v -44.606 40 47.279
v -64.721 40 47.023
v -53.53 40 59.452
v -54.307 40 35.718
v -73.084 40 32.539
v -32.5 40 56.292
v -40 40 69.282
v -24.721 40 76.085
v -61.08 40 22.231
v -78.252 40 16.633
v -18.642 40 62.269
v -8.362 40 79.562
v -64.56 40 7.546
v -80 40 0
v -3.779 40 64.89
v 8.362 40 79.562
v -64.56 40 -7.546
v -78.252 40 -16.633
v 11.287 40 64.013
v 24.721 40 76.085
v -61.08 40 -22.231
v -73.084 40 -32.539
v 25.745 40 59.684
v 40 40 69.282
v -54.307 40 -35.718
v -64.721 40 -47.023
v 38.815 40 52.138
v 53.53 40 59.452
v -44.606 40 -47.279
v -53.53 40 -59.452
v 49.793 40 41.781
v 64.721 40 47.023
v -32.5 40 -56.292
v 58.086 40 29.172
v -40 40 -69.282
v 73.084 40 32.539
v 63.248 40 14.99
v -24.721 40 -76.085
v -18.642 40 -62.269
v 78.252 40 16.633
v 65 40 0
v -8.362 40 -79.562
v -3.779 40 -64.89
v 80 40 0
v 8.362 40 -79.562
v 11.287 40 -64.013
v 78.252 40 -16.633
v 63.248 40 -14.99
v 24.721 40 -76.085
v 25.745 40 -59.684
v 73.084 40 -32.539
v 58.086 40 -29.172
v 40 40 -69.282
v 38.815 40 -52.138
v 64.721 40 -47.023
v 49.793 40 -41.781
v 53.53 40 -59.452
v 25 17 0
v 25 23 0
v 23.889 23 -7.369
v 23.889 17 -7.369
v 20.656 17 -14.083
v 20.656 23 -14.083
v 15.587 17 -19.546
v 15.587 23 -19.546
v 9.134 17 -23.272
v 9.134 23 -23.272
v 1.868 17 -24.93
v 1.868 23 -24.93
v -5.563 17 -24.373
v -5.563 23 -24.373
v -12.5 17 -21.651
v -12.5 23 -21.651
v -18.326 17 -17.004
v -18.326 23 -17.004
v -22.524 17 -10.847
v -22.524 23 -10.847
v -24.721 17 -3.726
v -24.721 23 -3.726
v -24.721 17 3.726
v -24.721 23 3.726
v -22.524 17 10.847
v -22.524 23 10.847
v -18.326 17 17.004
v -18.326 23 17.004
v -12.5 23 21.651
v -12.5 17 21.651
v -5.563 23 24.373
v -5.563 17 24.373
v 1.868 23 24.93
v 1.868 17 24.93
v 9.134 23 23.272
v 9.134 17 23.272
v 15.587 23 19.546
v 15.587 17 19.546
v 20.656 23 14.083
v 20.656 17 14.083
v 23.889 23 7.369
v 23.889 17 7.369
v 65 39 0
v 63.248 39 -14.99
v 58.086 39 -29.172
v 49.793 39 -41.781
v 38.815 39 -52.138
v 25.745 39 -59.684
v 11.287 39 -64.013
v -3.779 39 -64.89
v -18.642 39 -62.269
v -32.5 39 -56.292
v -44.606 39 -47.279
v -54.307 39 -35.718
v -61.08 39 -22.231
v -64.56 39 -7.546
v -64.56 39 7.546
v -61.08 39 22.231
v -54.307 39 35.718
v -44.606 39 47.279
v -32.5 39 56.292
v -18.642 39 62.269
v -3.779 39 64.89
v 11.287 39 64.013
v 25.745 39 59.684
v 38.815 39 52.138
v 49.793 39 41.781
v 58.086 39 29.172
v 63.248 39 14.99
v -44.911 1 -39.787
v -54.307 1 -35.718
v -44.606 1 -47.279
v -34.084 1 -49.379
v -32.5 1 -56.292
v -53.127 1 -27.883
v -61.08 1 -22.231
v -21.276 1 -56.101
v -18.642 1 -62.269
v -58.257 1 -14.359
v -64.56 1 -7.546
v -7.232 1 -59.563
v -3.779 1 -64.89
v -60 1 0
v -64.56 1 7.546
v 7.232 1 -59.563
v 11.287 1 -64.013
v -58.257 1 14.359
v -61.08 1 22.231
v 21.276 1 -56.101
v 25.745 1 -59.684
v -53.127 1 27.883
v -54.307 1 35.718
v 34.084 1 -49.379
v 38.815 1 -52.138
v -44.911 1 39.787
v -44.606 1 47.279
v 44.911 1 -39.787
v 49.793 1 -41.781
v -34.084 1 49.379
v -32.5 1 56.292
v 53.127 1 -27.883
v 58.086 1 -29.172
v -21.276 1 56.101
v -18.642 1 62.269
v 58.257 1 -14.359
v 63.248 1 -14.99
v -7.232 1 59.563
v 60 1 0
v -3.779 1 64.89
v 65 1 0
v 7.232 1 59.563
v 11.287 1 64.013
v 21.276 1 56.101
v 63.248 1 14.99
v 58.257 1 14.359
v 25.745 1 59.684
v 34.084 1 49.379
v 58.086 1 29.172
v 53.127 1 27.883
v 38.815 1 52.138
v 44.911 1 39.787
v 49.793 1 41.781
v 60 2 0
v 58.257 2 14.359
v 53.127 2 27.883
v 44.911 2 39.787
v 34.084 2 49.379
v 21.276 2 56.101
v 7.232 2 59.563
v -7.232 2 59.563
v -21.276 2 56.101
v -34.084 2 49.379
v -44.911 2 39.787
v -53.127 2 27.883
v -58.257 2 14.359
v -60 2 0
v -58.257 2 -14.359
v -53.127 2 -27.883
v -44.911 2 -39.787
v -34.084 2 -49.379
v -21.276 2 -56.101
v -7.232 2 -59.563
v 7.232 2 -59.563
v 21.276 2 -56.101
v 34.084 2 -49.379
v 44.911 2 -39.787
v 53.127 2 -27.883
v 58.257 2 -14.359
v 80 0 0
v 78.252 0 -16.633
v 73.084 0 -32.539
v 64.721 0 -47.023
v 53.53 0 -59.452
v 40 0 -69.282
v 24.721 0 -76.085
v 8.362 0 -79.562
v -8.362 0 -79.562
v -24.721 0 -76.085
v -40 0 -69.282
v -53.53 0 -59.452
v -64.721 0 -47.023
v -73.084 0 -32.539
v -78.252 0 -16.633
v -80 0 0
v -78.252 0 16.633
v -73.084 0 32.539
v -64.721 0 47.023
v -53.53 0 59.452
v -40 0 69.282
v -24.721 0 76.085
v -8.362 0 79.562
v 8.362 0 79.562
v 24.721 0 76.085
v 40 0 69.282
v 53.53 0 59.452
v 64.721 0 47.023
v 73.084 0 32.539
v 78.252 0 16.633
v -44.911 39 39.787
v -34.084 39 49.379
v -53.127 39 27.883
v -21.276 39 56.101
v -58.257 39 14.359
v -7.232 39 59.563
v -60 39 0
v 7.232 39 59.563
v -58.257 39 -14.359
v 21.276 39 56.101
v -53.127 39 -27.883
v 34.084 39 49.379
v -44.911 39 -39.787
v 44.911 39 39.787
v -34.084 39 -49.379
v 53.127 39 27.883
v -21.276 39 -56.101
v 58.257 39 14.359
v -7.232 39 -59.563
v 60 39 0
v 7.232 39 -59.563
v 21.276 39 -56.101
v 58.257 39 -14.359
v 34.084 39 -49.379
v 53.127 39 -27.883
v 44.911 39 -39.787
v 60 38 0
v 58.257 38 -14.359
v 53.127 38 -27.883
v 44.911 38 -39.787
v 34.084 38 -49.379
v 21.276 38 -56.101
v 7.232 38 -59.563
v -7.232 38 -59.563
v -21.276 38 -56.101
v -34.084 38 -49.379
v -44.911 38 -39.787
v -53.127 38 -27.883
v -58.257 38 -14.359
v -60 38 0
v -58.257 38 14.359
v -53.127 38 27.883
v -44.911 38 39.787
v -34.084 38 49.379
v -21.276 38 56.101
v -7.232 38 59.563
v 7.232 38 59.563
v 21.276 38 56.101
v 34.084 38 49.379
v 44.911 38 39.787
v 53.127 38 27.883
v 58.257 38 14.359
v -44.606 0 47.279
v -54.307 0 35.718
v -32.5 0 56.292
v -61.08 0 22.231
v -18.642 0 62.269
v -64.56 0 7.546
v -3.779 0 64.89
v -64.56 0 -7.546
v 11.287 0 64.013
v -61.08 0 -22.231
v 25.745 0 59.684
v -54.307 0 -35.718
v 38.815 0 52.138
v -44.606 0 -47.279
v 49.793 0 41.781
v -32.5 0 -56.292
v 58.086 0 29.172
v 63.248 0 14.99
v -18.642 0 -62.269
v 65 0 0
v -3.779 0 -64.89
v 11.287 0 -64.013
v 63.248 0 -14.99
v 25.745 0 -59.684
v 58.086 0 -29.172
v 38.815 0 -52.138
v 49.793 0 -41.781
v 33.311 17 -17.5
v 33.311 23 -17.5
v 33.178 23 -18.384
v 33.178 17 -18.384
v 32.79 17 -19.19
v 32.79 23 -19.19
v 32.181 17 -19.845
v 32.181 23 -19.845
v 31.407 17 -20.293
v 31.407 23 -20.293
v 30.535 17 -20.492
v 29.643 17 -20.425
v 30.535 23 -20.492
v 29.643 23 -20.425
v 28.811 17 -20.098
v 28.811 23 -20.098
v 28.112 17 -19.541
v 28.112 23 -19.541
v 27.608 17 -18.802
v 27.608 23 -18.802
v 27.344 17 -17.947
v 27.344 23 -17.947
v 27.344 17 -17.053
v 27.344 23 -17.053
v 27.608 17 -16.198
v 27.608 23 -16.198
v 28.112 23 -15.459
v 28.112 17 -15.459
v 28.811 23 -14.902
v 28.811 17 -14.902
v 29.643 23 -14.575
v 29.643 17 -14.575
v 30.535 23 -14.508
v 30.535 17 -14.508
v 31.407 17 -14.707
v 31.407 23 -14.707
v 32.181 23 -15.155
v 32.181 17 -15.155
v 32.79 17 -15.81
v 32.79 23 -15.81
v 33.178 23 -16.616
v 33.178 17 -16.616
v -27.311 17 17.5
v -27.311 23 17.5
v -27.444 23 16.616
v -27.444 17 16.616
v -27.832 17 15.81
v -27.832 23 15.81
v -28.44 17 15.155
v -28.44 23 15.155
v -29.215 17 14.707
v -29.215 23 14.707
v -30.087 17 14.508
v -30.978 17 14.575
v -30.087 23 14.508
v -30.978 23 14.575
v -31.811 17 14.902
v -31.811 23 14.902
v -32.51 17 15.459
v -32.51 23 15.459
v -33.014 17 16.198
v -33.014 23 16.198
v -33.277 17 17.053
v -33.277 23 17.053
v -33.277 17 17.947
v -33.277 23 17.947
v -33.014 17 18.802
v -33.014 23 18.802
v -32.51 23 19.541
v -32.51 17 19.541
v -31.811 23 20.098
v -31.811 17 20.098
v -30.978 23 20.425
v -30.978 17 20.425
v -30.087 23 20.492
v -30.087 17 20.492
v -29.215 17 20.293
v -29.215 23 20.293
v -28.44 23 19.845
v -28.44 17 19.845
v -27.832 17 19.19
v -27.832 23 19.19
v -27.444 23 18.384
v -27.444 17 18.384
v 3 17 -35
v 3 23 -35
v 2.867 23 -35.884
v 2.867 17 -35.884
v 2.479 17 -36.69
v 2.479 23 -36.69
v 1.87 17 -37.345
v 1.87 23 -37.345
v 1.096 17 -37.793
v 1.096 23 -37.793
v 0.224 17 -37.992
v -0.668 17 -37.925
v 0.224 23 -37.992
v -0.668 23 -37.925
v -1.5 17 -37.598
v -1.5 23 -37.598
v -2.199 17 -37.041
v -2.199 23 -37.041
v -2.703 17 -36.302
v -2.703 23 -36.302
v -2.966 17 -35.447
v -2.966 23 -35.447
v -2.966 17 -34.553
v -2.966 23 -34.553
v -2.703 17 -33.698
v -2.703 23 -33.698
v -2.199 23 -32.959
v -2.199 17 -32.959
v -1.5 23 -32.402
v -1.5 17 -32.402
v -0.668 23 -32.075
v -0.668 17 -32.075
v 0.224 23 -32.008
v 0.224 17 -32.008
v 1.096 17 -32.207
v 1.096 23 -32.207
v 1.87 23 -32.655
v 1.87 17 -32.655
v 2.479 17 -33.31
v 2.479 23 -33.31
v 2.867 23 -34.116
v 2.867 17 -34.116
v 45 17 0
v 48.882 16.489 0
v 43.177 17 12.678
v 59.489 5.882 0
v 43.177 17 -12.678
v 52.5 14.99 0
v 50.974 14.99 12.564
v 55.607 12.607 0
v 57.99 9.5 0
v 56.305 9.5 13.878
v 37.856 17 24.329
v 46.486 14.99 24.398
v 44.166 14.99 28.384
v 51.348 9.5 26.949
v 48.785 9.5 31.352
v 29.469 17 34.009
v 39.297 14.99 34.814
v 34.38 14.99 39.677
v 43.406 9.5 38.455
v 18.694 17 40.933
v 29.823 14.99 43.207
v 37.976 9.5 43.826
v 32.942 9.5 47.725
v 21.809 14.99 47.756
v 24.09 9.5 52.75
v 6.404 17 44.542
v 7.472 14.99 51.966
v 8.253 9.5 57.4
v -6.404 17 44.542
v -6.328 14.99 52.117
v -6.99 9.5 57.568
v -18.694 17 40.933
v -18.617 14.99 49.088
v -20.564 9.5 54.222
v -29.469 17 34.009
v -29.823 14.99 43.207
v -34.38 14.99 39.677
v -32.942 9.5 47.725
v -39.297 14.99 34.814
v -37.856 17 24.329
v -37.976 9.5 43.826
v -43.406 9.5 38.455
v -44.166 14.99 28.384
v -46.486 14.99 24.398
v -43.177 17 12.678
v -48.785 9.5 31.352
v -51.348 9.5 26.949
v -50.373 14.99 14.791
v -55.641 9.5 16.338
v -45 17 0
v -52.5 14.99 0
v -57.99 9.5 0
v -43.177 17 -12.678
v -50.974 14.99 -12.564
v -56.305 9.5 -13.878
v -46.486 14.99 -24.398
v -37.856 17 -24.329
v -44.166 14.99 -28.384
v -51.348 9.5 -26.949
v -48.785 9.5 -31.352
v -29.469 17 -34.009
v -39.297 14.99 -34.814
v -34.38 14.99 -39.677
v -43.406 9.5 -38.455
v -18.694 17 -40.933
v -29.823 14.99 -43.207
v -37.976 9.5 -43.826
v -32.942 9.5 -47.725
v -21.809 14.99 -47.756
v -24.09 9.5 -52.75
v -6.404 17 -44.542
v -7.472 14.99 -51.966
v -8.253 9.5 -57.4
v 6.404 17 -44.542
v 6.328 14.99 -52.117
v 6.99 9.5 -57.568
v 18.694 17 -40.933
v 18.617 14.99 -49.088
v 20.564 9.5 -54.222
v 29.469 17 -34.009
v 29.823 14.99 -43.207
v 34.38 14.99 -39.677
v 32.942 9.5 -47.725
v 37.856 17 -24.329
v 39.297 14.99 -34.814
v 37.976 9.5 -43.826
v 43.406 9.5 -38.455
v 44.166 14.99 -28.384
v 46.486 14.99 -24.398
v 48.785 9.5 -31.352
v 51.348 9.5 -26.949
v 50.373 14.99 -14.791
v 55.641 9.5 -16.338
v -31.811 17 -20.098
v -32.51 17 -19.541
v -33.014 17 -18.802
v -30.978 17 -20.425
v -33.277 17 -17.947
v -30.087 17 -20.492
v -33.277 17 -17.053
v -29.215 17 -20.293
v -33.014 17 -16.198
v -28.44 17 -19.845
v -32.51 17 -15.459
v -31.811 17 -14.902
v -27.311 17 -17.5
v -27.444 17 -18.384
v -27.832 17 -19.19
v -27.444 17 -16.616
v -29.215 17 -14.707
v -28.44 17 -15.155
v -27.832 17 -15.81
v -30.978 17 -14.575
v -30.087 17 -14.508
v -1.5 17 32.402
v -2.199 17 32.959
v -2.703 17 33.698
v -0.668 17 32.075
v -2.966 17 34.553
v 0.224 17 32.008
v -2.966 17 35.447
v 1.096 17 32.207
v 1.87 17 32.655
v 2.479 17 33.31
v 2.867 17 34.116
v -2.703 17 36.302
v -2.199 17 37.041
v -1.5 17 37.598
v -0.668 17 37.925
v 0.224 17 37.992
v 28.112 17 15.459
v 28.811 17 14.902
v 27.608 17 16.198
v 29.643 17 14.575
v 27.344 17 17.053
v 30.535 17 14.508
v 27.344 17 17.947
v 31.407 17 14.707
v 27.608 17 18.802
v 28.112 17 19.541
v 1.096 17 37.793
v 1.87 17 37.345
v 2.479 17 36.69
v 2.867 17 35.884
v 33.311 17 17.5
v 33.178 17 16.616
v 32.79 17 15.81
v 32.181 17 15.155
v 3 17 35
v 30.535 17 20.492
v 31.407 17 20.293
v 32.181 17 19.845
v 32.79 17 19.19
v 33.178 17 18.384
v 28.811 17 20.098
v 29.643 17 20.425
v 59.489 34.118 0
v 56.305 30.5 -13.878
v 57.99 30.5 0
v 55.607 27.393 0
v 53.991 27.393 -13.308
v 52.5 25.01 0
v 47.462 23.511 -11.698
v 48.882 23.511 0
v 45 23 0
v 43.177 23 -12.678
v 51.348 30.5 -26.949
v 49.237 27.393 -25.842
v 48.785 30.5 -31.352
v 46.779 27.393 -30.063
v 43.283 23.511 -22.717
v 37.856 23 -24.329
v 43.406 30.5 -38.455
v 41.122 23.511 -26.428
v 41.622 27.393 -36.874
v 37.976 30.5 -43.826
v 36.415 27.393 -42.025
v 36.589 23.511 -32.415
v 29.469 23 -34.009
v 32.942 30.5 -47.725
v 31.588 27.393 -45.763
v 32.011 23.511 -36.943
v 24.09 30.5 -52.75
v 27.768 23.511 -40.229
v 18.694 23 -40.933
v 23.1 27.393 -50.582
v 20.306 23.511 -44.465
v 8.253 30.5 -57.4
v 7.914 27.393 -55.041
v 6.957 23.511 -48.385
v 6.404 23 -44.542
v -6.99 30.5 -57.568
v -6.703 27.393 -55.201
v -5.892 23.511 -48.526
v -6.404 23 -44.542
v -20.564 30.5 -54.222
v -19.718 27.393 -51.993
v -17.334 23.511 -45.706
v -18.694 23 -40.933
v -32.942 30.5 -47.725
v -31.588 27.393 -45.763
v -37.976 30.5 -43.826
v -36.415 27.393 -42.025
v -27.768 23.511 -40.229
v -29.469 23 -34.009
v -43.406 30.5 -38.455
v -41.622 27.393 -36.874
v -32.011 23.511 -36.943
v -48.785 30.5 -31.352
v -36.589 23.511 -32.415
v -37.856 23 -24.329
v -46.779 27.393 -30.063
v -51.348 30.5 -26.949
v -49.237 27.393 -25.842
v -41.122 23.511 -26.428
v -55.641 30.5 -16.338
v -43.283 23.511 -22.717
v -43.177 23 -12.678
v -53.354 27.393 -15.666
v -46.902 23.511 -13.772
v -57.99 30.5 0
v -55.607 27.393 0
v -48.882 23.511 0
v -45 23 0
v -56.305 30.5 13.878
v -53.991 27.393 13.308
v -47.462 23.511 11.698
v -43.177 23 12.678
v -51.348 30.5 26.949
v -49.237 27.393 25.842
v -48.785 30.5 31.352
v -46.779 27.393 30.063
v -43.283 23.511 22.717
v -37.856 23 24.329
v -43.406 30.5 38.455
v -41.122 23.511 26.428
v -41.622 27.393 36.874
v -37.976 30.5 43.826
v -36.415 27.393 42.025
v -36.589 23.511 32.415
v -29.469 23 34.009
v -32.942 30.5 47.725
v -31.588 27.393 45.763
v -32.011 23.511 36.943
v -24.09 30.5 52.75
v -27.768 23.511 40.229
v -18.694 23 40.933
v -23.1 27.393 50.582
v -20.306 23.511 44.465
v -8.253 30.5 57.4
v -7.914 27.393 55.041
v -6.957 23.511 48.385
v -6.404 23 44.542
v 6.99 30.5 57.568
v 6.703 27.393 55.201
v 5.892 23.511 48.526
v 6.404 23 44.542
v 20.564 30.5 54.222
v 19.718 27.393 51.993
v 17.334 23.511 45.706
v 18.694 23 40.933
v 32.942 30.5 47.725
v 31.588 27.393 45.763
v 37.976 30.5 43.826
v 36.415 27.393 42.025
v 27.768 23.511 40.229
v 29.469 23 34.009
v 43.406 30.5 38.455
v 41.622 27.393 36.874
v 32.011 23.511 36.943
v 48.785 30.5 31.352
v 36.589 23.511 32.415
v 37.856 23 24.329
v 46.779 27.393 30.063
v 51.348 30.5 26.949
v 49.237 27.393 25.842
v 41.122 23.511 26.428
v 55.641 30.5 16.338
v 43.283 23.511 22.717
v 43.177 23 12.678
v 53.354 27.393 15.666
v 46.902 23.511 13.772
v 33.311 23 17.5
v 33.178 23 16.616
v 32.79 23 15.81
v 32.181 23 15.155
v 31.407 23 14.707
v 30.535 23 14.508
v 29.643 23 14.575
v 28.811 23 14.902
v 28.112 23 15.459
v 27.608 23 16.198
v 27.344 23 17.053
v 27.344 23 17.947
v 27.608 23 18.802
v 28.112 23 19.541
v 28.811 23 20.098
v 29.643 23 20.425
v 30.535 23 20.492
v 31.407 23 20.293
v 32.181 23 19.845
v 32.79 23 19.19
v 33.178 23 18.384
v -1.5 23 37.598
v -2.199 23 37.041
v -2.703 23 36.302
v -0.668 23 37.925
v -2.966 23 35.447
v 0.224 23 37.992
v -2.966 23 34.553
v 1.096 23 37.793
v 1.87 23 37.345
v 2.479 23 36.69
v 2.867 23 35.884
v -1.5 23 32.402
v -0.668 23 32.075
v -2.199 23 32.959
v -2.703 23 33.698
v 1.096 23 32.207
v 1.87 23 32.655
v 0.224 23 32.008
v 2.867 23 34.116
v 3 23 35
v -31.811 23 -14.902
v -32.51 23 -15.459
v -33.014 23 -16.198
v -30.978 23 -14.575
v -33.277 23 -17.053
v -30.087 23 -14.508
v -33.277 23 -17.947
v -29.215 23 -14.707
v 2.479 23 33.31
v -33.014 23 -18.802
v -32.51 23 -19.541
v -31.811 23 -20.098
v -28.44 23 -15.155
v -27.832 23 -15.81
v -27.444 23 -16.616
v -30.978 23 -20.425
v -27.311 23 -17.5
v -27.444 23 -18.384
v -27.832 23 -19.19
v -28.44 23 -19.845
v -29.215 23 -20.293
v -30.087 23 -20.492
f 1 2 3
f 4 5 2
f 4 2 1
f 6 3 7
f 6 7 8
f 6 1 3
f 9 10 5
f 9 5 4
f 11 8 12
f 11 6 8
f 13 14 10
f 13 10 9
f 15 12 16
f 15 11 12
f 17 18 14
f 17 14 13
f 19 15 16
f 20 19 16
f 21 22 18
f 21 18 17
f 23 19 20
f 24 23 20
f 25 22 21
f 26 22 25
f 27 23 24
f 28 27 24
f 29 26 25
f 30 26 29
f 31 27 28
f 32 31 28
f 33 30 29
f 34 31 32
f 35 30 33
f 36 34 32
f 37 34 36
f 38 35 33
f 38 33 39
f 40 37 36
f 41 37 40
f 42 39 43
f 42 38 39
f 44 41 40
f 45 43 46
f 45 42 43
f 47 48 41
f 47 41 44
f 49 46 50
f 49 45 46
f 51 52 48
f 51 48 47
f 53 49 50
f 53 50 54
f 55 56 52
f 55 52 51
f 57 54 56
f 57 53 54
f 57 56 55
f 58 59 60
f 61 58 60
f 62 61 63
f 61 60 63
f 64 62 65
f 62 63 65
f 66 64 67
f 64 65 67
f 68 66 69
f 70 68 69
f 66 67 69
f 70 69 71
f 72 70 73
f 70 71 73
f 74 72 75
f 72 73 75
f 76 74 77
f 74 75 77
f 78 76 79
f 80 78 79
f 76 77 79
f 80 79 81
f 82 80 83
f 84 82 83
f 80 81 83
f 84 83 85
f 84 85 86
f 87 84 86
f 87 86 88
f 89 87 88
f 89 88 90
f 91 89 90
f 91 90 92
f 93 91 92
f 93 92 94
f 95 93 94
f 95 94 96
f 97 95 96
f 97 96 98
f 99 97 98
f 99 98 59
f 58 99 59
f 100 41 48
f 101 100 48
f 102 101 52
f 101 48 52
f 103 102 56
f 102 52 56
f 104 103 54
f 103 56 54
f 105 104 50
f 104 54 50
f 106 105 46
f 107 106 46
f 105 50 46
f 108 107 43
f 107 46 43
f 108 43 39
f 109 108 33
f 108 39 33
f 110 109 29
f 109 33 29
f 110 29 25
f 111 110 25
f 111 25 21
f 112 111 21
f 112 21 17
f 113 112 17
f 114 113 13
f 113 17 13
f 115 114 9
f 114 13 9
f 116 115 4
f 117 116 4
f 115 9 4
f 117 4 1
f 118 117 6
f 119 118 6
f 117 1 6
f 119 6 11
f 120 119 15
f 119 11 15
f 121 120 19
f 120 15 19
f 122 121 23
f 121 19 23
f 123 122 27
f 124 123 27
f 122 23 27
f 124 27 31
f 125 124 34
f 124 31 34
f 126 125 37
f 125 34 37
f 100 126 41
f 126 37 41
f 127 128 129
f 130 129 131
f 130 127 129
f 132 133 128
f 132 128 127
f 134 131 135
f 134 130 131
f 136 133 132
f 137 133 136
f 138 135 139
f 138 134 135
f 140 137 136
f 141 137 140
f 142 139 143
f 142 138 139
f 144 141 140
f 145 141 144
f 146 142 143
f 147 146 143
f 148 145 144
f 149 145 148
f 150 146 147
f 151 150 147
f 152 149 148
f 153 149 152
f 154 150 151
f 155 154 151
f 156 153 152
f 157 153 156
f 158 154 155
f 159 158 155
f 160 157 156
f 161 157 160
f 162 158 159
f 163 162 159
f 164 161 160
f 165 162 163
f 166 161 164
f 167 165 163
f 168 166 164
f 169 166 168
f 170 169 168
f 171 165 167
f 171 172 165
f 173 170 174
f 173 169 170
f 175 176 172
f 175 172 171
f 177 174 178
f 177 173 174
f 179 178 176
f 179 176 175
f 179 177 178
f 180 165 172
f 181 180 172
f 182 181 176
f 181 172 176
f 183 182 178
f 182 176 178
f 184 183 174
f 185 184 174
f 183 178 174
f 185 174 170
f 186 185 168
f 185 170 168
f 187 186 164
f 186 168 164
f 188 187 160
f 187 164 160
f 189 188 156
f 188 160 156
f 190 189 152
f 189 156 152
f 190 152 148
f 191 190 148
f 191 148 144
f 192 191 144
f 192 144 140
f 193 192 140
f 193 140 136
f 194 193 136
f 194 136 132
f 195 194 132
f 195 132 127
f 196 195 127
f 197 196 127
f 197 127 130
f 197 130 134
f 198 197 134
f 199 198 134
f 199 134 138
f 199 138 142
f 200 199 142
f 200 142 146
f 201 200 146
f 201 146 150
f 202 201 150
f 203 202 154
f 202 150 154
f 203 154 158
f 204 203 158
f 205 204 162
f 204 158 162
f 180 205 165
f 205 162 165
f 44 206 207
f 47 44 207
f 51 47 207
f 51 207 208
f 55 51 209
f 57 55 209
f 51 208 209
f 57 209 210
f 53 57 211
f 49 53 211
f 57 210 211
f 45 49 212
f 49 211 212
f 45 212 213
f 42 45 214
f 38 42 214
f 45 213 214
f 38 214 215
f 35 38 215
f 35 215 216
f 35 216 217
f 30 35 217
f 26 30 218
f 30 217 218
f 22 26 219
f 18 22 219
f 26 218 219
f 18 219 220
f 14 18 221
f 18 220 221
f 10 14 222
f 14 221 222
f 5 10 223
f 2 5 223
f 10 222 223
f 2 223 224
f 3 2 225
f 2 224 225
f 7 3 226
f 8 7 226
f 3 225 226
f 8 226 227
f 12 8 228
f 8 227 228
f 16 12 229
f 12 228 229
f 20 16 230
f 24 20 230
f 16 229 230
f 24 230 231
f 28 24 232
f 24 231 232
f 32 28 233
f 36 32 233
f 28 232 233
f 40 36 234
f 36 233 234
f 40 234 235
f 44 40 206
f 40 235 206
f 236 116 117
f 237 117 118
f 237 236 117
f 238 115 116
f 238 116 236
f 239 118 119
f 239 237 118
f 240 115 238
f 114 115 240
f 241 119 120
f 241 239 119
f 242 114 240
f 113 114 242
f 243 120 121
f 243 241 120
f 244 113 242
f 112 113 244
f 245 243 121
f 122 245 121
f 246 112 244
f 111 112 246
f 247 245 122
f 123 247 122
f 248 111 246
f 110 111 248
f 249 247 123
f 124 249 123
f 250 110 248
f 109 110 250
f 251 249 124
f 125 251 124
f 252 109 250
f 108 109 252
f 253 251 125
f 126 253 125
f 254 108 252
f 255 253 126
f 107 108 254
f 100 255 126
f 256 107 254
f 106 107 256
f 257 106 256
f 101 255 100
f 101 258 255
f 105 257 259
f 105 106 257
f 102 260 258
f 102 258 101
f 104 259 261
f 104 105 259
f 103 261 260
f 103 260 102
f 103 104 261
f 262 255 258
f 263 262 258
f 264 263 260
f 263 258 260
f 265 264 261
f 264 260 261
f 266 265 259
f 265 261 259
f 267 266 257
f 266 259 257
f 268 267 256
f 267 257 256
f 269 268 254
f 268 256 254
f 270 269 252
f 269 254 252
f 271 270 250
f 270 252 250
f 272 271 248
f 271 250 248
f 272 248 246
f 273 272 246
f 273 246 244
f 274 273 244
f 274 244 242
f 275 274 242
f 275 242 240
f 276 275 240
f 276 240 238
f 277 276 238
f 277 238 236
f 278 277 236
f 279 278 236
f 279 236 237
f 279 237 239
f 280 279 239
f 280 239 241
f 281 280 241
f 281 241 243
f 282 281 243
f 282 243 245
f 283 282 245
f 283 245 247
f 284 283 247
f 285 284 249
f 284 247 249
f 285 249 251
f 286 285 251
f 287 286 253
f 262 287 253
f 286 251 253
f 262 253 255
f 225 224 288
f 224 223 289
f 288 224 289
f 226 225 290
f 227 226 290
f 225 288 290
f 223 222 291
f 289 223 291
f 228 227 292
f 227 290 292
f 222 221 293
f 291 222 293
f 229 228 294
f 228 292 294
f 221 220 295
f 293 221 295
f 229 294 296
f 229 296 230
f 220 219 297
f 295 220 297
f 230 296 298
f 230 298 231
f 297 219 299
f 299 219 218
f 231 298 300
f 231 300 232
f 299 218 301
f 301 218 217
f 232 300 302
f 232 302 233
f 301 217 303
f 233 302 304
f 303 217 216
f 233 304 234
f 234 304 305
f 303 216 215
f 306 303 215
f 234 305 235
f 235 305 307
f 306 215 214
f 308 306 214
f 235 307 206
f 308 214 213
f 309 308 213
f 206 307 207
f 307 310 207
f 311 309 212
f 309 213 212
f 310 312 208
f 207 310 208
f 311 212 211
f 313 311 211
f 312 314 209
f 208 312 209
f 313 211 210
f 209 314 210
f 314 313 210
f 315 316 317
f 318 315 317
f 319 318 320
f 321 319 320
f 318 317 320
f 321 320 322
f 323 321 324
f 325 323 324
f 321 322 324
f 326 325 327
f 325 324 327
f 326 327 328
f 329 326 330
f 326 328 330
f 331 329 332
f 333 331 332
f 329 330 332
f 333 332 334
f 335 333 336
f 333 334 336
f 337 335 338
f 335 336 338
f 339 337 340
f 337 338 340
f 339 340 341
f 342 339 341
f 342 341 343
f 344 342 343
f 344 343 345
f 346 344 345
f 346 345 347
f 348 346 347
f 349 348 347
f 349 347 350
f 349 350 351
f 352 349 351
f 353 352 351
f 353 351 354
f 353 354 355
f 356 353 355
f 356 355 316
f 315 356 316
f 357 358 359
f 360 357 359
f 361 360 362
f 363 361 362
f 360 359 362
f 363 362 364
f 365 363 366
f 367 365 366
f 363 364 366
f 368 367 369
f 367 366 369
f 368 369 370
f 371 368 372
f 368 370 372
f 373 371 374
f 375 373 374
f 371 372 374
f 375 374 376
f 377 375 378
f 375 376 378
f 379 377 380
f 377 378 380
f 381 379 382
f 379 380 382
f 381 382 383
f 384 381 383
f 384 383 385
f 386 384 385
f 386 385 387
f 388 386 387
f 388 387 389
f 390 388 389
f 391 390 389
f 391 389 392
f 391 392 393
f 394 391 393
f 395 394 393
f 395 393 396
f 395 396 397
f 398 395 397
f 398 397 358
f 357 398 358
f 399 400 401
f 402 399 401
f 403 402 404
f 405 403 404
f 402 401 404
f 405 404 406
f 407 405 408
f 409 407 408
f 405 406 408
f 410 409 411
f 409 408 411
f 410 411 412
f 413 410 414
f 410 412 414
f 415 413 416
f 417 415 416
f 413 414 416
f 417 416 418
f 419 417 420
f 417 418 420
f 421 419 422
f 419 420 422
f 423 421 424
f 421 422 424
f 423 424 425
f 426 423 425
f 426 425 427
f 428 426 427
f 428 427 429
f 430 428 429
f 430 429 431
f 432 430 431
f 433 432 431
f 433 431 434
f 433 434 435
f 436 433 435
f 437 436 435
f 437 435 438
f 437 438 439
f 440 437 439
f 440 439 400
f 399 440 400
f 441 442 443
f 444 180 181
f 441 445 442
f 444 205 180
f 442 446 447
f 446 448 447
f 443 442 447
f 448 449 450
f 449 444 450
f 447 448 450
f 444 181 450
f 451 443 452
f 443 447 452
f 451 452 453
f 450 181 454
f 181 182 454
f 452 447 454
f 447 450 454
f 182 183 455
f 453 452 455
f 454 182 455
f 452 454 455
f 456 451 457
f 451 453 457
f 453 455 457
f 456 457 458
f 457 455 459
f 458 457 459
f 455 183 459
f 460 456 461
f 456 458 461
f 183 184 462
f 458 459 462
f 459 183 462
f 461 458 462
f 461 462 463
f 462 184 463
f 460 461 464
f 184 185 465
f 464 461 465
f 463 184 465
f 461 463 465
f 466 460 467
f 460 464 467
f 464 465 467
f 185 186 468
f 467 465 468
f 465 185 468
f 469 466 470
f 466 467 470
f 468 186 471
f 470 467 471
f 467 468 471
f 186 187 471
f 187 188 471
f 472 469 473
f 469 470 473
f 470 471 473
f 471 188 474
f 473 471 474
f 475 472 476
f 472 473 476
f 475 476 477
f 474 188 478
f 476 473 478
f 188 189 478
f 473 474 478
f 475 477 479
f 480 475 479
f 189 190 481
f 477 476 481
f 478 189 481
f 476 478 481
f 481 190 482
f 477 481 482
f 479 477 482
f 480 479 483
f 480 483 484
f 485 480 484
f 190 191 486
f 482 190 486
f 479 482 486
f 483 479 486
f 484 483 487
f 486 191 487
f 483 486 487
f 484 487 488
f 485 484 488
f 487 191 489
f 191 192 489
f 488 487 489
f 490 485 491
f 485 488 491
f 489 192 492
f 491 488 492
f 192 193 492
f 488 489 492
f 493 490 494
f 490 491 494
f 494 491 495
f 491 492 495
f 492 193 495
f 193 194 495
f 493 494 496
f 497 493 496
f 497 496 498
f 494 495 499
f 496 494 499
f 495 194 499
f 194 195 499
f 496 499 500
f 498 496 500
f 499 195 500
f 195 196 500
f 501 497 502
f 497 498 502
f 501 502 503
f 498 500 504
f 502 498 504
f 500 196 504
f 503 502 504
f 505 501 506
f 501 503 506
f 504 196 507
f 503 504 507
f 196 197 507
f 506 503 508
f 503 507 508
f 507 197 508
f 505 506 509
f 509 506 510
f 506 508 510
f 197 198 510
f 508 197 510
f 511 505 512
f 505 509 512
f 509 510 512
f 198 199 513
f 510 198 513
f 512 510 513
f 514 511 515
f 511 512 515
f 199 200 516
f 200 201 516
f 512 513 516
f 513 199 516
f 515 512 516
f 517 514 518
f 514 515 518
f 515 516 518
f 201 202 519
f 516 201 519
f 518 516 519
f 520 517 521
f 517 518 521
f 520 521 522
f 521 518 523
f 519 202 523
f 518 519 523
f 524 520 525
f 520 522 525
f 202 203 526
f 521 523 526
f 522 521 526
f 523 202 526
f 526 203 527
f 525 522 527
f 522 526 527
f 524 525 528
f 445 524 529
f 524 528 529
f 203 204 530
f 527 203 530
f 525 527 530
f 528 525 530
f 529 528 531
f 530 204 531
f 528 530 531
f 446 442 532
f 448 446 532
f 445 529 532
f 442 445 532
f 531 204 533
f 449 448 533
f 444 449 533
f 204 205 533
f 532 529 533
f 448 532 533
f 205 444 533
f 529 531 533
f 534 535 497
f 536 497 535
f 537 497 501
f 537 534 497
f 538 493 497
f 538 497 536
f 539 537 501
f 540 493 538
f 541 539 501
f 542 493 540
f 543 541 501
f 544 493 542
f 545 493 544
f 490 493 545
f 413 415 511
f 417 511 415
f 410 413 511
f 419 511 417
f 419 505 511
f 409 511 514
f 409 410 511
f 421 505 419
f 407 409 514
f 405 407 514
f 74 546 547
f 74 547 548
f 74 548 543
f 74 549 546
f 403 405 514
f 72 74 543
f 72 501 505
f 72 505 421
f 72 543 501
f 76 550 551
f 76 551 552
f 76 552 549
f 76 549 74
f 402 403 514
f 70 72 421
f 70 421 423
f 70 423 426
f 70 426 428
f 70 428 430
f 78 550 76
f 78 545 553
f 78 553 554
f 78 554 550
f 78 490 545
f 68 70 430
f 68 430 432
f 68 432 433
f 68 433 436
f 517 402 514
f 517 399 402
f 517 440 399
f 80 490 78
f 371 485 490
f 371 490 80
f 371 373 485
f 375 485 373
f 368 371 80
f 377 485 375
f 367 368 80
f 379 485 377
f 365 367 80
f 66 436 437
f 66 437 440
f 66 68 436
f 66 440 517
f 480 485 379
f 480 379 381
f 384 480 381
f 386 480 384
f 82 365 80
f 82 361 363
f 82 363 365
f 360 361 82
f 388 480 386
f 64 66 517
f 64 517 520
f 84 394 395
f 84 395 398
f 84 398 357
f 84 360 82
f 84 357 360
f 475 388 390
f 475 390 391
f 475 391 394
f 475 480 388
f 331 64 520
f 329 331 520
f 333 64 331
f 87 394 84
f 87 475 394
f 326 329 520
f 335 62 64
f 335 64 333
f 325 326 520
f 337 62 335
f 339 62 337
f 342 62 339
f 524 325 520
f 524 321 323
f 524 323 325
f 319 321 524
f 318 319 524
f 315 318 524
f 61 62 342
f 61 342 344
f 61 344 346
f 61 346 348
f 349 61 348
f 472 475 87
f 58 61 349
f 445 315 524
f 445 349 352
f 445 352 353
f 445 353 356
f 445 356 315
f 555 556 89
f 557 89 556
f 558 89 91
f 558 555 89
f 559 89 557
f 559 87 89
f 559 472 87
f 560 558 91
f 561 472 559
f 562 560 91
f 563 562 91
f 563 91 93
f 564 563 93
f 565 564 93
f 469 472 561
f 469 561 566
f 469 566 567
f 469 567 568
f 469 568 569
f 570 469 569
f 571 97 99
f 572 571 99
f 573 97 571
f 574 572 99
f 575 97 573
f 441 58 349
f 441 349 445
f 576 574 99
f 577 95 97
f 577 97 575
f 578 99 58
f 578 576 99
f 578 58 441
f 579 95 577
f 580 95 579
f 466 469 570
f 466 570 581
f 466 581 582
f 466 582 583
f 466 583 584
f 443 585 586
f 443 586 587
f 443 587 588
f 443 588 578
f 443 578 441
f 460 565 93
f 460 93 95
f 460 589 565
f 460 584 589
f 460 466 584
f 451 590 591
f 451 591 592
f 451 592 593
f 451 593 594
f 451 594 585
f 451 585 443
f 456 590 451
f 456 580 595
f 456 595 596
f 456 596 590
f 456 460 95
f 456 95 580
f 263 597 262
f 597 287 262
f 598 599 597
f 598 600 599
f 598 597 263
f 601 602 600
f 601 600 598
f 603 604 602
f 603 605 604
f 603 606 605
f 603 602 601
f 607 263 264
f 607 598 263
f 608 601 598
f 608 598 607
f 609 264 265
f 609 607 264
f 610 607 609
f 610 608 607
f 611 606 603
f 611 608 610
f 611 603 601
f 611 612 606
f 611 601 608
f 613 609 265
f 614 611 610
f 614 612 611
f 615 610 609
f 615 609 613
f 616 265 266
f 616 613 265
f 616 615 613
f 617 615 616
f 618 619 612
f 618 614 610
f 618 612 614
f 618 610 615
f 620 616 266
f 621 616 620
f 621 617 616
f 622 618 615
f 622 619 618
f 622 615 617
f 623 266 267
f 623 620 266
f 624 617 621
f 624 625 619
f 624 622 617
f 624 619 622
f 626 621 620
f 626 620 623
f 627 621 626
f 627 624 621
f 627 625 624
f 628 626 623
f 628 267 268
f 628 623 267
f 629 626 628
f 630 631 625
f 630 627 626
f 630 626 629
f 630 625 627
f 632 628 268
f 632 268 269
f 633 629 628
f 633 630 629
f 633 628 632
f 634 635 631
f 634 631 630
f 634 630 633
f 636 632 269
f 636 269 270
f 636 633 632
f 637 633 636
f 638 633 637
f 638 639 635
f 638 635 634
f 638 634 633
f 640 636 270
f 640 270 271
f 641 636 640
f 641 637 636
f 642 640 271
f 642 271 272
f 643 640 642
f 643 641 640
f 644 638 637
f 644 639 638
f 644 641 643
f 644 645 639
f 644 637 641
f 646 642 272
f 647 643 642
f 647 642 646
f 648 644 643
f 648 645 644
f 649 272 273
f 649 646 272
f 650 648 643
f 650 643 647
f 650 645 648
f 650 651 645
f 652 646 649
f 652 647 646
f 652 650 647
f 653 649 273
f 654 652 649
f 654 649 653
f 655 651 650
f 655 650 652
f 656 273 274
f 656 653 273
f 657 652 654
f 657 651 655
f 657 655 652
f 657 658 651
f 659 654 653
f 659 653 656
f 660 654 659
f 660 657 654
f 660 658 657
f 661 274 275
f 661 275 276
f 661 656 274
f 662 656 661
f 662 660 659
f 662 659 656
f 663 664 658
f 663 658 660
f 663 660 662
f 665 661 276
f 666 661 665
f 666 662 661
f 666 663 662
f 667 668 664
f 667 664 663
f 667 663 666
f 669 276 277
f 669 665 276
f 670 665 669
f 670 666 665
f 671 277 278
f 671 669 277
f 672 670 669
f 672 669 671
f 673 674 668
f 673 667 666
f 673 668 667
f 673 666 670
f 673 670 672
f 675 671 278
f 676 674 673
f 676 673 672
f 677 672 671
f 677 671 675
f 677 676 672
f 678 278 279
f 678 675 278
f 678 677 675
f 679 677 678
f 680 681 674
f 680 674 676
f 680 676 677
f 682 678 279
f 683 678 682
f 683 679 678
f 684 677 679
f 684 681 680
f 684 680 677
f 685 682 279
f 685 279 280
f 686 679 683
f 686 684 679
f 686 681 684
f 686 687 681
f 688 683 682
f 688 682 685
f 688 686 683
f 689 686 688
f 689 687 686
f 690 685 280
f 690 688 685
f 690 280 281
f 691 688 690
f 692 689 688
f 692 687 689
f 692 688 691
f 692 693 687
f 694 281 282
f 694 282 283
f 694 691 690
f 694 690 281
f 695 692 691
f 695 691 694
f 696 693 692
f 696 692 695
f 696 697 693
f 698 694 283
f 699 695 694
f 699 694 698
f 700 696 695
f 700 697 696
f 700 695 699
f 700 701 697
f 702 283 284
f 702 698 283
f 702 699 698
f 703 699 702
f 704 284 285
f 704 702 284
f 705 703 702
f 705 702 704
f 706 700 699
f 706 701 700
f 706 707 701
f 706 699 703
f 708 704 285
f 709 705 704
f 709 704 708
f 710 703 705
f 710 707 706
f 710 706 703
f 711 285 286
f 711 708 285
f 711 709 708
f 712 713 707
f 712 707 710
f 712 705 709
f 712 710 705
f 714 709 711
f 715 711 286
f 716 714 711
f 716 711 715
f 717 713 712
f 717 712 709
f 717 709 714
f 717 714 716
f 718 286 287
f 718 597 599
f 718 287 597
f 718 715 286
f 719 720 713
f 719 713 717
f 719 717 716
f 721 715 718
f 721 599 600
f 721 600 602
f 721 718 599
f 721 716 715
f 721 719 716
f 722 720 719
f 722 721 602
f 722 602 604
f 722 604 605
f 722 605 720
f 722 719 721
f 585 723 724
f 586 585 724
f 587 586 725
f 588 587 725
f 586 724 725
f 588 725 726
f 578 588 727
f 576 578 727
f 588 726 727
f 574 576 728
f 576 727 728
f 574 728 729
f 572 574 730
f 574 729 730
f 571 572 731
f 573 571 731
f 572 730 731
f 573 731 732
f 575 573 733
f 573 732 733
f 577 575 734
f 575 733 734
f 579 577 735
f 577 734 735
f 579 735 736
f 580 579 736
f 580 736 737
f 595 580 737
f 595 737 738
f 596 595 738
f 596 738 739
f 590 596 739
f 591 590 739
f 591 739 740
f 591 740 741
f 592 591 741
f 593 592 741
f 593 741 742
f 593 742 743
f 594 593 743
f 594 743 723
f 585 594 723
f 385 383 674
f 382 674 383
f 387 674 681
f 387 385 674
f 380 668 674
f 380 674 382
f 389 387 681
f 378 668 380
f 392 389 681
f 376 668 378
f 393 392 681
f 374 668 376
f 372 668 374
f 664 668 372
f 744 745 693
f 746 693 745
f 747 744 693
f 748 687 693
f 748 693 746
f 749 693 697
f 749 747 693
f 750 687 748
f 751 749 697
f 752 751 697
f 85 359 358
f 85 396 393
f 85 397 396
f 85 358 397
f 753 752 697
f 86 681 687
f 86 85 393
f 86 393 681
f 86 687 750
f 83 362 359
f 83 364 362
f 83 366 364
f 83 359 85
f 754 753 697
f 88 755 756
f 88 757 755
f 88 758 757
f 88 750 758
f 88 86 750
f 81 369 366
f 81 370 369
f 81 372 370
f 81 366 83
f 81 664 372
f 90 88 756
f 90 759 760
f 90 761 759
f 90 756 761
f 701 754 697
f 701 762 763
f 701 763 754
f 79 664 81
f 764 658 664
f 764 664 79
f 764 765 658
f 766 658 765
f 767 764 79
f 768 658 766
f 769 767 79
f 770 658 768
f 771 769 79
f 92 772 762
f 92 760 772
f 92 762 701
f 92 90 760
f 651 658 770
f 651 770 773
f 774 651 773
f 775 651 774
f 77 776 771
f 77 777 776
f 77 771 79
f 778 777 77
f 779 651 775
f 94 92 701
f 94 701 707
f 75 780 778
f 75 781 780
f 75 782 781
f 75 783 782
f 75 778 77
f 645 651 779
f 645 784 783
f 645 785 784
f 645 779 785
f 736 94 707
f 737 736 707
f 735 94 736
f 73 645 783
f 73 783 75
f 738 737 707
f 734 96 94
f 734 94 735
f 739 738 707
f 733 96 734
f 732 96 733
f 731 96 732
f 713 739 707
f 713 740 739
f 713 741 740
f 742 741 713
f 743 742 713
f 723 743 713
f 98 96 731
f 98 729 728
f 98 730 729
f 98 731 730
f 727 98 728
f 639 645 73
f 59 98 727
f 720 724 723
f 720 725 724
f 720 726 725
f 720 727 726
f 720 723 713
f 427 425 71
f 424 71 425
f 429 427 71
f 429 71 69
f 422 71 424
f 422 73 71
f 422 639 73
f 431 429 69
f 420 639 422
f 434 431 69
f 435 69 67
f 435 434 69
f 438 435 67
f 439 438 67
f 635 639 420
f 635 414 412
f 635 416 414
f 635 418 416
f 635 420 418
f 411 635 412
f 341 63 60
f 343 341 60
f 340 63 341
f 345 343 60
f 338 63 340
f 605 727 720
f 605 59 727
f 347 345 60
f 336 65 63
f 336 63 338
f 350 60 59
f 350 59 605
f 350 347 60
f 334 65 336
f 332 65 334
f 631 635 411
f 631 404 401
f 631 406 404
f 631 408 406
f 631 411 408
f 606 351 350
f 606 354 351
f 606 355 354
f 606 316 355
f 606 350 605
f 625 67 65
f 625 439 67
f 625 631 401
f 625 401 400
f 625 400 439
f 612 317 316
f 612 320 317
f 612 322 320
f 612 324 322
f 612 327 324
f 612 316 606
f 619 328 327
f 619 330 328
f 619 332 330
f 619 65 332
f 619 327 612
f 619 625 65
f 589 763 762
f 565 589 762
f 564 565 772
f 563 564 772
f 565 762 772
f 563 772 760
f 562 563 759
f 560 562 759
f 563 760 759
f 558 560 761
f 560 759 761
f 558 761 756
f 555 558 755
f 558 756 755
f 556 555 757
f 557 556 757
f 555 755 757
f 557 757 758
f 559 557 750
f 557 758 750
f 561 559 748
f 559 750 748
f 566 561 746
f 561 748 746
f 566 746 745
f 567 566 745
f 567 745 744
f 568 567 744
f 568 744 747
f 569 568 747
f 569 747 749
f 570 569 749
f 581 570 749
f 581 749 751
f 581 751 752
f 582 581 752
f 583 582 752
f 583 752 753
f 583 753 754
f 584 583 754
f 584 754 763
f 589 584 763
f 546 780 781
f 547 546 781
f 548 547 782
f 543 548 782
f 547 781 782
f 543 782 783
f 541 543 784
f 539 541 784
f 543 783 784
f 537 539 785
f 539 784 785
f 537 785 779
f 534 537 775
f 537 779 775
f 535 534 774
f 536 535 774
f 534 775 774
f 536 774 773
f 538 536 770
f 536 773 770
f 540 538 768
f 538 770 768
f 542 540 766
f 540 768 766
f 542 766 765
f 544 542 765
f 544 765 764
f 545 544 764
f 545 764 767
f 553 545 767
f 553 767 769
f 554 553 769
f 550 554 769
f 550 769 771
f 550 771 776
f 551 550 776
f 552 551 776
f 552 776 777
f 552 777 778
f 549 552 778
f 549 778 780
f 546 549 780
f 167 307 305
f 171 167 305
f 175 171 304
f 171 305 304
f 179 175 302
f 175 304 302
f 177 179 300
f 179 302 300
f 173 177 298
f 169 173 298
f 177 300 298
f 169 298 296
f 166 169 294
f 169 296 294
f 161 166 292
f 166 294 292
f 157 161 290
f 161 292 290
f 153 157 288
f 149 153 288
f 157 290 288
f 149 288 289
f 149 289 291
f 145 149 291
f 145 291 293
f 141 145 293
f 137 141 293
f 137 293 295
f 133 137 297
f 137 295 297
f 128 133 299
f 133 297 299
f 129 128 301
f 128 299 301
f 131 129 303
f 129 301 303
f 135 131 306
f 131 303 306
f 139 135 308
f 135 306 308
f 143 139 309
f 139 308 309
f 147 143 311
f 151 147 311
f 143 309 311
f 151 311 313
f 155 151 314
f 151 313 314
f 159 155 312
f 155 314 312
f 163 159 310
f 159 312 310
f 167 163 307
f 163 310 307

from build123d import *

# Parameters (mm, degrees)
SKETCH1_R           = 80
BOSS_EXTRUDE1_DEPTH = 40
SKETCH2_R           = 60
CUT_EXTRUDE1_DEPTH  = 17
SKETCH3_R           = 25
CUT_EXTRUDE2_DEPTH  = 24
SKETCH4_R           = 3
CUT_EXTRUDE3_DEPTH  = 24
SKETCH6_R           = 60
CUT_EXTRUDE4_DEPTH  = 17
SKETCH7_R           = 65
CUT_EXTRUDE5_DEPTH  = 1
SKETCH8_R           = 65
CUT_EXTRUDE6_DEPTH  = 1
FILLET1_R           = 15
FILLET2_R           = 15


with BuildPart() as part:
    # Sketch1 → Boss-Extrude1 (new body)
    with BuildSketch(Plane(origin=(0, 0, 0), x_dir=(1, 0, 0), z_dir=(0, 1, 0))):
        Circle(SKETCH1_R)
    extrude(amount=BOSS_EXTRUDE1_DEPTH)

    # Sketch2 → Cut-Extrude1 (cut)
    with BuildSketch(Plane(origin=(0, 40, 0), x_dir=(1, 0, 0), z_dir=(0, 1, 0))):
        Circle(SKETCH2_R)
    extrude(amount=-CUT_EXTRUDE1_DEPTH, mode=Mode.SUBTRACT)

    # Sketch3 → Cut-Extrude2 (cut, through all)
    with BuildSketch(Plane(origin=(0, 23, 0), x_dir=(1, 0, 0), z_dir=(0, 1, 0))):
        Circle(SKETCH3_R)
    extrude(amount=-CUT_EXTRUDE2_DEPTH, mode=Mode.SUBTRACT)

    # Sketch4 → Cut-Extrude3 (cut, through all)
    with BuildSketch(Plane(origin=(0, 23, 0), x_dir=(1, 0, 0), z_dir=(0, 1, 0))):
        with Locations((0, 35)):
            Circle(SKETCH4_R)
        with Locations((30.310889132, 17.5)):
            Circle(SKETCH4_R)
        with Locations((30.310889132, -17.5)):
            Circle(SKETCH4_R)
        with Locations((0, -35)):
            Circle(SKETCH4_R)
        with Locations((-30.310889132, -17.5)):
            Circle(SKETCH4_R)
        with Locations((-30.310889132, 17.5)):
            Circle(SKETCH4_R)
    extrude(amount=-CUT_EXTRUDE3_DEPTH, mode=Mode.SUBTRACT)

    # Sketch6 → Cut-Extrude4 (cut)
    with BuildSketch(Plane.XZ):
        Circle(SKETCH6_R)
    extrude(amount=-CUT_EXTRUDE4_DEPTH, mode=Mode.SUBTRACT)

    # Sketch7 → Cut-Extrude5 (cut)
    with BuildSketch(Plane.XZ):
        Circle(SKETCH7_R)
    extrude(amount=-CUT_EXTRUDE5_DEPTH, mode=Mode.SUBTRACT)

    # Sketch8 → Cut-Extrude6 (cut)
    with BuildSketch(Plane(origin=(0, 40, 0), x_dir=(1, 0, 0), z_dir=(0, 1, 0))):
        Circle(SKETCH8_R)
    extrude(amount=-CUT_EXTRUDE6_DEPTH, mode=Mode.SUBTRACT)

    # Fillet1
    fillet1_edges = [part.edges().sort_by_distance(p)[0] for p in [
        (-60, 23, 0),
    ]]
    fillet(fillet1_edges, radius=FILLET1_R)

    # Fillet2
    fillet2_edges = [part.edges().sort_by_distance(p)[0] for p in [
        (-60, 17, 0),
    ]]
    fillet(fillet2_edges, radius=FILLET2_R)


solid = part.part
